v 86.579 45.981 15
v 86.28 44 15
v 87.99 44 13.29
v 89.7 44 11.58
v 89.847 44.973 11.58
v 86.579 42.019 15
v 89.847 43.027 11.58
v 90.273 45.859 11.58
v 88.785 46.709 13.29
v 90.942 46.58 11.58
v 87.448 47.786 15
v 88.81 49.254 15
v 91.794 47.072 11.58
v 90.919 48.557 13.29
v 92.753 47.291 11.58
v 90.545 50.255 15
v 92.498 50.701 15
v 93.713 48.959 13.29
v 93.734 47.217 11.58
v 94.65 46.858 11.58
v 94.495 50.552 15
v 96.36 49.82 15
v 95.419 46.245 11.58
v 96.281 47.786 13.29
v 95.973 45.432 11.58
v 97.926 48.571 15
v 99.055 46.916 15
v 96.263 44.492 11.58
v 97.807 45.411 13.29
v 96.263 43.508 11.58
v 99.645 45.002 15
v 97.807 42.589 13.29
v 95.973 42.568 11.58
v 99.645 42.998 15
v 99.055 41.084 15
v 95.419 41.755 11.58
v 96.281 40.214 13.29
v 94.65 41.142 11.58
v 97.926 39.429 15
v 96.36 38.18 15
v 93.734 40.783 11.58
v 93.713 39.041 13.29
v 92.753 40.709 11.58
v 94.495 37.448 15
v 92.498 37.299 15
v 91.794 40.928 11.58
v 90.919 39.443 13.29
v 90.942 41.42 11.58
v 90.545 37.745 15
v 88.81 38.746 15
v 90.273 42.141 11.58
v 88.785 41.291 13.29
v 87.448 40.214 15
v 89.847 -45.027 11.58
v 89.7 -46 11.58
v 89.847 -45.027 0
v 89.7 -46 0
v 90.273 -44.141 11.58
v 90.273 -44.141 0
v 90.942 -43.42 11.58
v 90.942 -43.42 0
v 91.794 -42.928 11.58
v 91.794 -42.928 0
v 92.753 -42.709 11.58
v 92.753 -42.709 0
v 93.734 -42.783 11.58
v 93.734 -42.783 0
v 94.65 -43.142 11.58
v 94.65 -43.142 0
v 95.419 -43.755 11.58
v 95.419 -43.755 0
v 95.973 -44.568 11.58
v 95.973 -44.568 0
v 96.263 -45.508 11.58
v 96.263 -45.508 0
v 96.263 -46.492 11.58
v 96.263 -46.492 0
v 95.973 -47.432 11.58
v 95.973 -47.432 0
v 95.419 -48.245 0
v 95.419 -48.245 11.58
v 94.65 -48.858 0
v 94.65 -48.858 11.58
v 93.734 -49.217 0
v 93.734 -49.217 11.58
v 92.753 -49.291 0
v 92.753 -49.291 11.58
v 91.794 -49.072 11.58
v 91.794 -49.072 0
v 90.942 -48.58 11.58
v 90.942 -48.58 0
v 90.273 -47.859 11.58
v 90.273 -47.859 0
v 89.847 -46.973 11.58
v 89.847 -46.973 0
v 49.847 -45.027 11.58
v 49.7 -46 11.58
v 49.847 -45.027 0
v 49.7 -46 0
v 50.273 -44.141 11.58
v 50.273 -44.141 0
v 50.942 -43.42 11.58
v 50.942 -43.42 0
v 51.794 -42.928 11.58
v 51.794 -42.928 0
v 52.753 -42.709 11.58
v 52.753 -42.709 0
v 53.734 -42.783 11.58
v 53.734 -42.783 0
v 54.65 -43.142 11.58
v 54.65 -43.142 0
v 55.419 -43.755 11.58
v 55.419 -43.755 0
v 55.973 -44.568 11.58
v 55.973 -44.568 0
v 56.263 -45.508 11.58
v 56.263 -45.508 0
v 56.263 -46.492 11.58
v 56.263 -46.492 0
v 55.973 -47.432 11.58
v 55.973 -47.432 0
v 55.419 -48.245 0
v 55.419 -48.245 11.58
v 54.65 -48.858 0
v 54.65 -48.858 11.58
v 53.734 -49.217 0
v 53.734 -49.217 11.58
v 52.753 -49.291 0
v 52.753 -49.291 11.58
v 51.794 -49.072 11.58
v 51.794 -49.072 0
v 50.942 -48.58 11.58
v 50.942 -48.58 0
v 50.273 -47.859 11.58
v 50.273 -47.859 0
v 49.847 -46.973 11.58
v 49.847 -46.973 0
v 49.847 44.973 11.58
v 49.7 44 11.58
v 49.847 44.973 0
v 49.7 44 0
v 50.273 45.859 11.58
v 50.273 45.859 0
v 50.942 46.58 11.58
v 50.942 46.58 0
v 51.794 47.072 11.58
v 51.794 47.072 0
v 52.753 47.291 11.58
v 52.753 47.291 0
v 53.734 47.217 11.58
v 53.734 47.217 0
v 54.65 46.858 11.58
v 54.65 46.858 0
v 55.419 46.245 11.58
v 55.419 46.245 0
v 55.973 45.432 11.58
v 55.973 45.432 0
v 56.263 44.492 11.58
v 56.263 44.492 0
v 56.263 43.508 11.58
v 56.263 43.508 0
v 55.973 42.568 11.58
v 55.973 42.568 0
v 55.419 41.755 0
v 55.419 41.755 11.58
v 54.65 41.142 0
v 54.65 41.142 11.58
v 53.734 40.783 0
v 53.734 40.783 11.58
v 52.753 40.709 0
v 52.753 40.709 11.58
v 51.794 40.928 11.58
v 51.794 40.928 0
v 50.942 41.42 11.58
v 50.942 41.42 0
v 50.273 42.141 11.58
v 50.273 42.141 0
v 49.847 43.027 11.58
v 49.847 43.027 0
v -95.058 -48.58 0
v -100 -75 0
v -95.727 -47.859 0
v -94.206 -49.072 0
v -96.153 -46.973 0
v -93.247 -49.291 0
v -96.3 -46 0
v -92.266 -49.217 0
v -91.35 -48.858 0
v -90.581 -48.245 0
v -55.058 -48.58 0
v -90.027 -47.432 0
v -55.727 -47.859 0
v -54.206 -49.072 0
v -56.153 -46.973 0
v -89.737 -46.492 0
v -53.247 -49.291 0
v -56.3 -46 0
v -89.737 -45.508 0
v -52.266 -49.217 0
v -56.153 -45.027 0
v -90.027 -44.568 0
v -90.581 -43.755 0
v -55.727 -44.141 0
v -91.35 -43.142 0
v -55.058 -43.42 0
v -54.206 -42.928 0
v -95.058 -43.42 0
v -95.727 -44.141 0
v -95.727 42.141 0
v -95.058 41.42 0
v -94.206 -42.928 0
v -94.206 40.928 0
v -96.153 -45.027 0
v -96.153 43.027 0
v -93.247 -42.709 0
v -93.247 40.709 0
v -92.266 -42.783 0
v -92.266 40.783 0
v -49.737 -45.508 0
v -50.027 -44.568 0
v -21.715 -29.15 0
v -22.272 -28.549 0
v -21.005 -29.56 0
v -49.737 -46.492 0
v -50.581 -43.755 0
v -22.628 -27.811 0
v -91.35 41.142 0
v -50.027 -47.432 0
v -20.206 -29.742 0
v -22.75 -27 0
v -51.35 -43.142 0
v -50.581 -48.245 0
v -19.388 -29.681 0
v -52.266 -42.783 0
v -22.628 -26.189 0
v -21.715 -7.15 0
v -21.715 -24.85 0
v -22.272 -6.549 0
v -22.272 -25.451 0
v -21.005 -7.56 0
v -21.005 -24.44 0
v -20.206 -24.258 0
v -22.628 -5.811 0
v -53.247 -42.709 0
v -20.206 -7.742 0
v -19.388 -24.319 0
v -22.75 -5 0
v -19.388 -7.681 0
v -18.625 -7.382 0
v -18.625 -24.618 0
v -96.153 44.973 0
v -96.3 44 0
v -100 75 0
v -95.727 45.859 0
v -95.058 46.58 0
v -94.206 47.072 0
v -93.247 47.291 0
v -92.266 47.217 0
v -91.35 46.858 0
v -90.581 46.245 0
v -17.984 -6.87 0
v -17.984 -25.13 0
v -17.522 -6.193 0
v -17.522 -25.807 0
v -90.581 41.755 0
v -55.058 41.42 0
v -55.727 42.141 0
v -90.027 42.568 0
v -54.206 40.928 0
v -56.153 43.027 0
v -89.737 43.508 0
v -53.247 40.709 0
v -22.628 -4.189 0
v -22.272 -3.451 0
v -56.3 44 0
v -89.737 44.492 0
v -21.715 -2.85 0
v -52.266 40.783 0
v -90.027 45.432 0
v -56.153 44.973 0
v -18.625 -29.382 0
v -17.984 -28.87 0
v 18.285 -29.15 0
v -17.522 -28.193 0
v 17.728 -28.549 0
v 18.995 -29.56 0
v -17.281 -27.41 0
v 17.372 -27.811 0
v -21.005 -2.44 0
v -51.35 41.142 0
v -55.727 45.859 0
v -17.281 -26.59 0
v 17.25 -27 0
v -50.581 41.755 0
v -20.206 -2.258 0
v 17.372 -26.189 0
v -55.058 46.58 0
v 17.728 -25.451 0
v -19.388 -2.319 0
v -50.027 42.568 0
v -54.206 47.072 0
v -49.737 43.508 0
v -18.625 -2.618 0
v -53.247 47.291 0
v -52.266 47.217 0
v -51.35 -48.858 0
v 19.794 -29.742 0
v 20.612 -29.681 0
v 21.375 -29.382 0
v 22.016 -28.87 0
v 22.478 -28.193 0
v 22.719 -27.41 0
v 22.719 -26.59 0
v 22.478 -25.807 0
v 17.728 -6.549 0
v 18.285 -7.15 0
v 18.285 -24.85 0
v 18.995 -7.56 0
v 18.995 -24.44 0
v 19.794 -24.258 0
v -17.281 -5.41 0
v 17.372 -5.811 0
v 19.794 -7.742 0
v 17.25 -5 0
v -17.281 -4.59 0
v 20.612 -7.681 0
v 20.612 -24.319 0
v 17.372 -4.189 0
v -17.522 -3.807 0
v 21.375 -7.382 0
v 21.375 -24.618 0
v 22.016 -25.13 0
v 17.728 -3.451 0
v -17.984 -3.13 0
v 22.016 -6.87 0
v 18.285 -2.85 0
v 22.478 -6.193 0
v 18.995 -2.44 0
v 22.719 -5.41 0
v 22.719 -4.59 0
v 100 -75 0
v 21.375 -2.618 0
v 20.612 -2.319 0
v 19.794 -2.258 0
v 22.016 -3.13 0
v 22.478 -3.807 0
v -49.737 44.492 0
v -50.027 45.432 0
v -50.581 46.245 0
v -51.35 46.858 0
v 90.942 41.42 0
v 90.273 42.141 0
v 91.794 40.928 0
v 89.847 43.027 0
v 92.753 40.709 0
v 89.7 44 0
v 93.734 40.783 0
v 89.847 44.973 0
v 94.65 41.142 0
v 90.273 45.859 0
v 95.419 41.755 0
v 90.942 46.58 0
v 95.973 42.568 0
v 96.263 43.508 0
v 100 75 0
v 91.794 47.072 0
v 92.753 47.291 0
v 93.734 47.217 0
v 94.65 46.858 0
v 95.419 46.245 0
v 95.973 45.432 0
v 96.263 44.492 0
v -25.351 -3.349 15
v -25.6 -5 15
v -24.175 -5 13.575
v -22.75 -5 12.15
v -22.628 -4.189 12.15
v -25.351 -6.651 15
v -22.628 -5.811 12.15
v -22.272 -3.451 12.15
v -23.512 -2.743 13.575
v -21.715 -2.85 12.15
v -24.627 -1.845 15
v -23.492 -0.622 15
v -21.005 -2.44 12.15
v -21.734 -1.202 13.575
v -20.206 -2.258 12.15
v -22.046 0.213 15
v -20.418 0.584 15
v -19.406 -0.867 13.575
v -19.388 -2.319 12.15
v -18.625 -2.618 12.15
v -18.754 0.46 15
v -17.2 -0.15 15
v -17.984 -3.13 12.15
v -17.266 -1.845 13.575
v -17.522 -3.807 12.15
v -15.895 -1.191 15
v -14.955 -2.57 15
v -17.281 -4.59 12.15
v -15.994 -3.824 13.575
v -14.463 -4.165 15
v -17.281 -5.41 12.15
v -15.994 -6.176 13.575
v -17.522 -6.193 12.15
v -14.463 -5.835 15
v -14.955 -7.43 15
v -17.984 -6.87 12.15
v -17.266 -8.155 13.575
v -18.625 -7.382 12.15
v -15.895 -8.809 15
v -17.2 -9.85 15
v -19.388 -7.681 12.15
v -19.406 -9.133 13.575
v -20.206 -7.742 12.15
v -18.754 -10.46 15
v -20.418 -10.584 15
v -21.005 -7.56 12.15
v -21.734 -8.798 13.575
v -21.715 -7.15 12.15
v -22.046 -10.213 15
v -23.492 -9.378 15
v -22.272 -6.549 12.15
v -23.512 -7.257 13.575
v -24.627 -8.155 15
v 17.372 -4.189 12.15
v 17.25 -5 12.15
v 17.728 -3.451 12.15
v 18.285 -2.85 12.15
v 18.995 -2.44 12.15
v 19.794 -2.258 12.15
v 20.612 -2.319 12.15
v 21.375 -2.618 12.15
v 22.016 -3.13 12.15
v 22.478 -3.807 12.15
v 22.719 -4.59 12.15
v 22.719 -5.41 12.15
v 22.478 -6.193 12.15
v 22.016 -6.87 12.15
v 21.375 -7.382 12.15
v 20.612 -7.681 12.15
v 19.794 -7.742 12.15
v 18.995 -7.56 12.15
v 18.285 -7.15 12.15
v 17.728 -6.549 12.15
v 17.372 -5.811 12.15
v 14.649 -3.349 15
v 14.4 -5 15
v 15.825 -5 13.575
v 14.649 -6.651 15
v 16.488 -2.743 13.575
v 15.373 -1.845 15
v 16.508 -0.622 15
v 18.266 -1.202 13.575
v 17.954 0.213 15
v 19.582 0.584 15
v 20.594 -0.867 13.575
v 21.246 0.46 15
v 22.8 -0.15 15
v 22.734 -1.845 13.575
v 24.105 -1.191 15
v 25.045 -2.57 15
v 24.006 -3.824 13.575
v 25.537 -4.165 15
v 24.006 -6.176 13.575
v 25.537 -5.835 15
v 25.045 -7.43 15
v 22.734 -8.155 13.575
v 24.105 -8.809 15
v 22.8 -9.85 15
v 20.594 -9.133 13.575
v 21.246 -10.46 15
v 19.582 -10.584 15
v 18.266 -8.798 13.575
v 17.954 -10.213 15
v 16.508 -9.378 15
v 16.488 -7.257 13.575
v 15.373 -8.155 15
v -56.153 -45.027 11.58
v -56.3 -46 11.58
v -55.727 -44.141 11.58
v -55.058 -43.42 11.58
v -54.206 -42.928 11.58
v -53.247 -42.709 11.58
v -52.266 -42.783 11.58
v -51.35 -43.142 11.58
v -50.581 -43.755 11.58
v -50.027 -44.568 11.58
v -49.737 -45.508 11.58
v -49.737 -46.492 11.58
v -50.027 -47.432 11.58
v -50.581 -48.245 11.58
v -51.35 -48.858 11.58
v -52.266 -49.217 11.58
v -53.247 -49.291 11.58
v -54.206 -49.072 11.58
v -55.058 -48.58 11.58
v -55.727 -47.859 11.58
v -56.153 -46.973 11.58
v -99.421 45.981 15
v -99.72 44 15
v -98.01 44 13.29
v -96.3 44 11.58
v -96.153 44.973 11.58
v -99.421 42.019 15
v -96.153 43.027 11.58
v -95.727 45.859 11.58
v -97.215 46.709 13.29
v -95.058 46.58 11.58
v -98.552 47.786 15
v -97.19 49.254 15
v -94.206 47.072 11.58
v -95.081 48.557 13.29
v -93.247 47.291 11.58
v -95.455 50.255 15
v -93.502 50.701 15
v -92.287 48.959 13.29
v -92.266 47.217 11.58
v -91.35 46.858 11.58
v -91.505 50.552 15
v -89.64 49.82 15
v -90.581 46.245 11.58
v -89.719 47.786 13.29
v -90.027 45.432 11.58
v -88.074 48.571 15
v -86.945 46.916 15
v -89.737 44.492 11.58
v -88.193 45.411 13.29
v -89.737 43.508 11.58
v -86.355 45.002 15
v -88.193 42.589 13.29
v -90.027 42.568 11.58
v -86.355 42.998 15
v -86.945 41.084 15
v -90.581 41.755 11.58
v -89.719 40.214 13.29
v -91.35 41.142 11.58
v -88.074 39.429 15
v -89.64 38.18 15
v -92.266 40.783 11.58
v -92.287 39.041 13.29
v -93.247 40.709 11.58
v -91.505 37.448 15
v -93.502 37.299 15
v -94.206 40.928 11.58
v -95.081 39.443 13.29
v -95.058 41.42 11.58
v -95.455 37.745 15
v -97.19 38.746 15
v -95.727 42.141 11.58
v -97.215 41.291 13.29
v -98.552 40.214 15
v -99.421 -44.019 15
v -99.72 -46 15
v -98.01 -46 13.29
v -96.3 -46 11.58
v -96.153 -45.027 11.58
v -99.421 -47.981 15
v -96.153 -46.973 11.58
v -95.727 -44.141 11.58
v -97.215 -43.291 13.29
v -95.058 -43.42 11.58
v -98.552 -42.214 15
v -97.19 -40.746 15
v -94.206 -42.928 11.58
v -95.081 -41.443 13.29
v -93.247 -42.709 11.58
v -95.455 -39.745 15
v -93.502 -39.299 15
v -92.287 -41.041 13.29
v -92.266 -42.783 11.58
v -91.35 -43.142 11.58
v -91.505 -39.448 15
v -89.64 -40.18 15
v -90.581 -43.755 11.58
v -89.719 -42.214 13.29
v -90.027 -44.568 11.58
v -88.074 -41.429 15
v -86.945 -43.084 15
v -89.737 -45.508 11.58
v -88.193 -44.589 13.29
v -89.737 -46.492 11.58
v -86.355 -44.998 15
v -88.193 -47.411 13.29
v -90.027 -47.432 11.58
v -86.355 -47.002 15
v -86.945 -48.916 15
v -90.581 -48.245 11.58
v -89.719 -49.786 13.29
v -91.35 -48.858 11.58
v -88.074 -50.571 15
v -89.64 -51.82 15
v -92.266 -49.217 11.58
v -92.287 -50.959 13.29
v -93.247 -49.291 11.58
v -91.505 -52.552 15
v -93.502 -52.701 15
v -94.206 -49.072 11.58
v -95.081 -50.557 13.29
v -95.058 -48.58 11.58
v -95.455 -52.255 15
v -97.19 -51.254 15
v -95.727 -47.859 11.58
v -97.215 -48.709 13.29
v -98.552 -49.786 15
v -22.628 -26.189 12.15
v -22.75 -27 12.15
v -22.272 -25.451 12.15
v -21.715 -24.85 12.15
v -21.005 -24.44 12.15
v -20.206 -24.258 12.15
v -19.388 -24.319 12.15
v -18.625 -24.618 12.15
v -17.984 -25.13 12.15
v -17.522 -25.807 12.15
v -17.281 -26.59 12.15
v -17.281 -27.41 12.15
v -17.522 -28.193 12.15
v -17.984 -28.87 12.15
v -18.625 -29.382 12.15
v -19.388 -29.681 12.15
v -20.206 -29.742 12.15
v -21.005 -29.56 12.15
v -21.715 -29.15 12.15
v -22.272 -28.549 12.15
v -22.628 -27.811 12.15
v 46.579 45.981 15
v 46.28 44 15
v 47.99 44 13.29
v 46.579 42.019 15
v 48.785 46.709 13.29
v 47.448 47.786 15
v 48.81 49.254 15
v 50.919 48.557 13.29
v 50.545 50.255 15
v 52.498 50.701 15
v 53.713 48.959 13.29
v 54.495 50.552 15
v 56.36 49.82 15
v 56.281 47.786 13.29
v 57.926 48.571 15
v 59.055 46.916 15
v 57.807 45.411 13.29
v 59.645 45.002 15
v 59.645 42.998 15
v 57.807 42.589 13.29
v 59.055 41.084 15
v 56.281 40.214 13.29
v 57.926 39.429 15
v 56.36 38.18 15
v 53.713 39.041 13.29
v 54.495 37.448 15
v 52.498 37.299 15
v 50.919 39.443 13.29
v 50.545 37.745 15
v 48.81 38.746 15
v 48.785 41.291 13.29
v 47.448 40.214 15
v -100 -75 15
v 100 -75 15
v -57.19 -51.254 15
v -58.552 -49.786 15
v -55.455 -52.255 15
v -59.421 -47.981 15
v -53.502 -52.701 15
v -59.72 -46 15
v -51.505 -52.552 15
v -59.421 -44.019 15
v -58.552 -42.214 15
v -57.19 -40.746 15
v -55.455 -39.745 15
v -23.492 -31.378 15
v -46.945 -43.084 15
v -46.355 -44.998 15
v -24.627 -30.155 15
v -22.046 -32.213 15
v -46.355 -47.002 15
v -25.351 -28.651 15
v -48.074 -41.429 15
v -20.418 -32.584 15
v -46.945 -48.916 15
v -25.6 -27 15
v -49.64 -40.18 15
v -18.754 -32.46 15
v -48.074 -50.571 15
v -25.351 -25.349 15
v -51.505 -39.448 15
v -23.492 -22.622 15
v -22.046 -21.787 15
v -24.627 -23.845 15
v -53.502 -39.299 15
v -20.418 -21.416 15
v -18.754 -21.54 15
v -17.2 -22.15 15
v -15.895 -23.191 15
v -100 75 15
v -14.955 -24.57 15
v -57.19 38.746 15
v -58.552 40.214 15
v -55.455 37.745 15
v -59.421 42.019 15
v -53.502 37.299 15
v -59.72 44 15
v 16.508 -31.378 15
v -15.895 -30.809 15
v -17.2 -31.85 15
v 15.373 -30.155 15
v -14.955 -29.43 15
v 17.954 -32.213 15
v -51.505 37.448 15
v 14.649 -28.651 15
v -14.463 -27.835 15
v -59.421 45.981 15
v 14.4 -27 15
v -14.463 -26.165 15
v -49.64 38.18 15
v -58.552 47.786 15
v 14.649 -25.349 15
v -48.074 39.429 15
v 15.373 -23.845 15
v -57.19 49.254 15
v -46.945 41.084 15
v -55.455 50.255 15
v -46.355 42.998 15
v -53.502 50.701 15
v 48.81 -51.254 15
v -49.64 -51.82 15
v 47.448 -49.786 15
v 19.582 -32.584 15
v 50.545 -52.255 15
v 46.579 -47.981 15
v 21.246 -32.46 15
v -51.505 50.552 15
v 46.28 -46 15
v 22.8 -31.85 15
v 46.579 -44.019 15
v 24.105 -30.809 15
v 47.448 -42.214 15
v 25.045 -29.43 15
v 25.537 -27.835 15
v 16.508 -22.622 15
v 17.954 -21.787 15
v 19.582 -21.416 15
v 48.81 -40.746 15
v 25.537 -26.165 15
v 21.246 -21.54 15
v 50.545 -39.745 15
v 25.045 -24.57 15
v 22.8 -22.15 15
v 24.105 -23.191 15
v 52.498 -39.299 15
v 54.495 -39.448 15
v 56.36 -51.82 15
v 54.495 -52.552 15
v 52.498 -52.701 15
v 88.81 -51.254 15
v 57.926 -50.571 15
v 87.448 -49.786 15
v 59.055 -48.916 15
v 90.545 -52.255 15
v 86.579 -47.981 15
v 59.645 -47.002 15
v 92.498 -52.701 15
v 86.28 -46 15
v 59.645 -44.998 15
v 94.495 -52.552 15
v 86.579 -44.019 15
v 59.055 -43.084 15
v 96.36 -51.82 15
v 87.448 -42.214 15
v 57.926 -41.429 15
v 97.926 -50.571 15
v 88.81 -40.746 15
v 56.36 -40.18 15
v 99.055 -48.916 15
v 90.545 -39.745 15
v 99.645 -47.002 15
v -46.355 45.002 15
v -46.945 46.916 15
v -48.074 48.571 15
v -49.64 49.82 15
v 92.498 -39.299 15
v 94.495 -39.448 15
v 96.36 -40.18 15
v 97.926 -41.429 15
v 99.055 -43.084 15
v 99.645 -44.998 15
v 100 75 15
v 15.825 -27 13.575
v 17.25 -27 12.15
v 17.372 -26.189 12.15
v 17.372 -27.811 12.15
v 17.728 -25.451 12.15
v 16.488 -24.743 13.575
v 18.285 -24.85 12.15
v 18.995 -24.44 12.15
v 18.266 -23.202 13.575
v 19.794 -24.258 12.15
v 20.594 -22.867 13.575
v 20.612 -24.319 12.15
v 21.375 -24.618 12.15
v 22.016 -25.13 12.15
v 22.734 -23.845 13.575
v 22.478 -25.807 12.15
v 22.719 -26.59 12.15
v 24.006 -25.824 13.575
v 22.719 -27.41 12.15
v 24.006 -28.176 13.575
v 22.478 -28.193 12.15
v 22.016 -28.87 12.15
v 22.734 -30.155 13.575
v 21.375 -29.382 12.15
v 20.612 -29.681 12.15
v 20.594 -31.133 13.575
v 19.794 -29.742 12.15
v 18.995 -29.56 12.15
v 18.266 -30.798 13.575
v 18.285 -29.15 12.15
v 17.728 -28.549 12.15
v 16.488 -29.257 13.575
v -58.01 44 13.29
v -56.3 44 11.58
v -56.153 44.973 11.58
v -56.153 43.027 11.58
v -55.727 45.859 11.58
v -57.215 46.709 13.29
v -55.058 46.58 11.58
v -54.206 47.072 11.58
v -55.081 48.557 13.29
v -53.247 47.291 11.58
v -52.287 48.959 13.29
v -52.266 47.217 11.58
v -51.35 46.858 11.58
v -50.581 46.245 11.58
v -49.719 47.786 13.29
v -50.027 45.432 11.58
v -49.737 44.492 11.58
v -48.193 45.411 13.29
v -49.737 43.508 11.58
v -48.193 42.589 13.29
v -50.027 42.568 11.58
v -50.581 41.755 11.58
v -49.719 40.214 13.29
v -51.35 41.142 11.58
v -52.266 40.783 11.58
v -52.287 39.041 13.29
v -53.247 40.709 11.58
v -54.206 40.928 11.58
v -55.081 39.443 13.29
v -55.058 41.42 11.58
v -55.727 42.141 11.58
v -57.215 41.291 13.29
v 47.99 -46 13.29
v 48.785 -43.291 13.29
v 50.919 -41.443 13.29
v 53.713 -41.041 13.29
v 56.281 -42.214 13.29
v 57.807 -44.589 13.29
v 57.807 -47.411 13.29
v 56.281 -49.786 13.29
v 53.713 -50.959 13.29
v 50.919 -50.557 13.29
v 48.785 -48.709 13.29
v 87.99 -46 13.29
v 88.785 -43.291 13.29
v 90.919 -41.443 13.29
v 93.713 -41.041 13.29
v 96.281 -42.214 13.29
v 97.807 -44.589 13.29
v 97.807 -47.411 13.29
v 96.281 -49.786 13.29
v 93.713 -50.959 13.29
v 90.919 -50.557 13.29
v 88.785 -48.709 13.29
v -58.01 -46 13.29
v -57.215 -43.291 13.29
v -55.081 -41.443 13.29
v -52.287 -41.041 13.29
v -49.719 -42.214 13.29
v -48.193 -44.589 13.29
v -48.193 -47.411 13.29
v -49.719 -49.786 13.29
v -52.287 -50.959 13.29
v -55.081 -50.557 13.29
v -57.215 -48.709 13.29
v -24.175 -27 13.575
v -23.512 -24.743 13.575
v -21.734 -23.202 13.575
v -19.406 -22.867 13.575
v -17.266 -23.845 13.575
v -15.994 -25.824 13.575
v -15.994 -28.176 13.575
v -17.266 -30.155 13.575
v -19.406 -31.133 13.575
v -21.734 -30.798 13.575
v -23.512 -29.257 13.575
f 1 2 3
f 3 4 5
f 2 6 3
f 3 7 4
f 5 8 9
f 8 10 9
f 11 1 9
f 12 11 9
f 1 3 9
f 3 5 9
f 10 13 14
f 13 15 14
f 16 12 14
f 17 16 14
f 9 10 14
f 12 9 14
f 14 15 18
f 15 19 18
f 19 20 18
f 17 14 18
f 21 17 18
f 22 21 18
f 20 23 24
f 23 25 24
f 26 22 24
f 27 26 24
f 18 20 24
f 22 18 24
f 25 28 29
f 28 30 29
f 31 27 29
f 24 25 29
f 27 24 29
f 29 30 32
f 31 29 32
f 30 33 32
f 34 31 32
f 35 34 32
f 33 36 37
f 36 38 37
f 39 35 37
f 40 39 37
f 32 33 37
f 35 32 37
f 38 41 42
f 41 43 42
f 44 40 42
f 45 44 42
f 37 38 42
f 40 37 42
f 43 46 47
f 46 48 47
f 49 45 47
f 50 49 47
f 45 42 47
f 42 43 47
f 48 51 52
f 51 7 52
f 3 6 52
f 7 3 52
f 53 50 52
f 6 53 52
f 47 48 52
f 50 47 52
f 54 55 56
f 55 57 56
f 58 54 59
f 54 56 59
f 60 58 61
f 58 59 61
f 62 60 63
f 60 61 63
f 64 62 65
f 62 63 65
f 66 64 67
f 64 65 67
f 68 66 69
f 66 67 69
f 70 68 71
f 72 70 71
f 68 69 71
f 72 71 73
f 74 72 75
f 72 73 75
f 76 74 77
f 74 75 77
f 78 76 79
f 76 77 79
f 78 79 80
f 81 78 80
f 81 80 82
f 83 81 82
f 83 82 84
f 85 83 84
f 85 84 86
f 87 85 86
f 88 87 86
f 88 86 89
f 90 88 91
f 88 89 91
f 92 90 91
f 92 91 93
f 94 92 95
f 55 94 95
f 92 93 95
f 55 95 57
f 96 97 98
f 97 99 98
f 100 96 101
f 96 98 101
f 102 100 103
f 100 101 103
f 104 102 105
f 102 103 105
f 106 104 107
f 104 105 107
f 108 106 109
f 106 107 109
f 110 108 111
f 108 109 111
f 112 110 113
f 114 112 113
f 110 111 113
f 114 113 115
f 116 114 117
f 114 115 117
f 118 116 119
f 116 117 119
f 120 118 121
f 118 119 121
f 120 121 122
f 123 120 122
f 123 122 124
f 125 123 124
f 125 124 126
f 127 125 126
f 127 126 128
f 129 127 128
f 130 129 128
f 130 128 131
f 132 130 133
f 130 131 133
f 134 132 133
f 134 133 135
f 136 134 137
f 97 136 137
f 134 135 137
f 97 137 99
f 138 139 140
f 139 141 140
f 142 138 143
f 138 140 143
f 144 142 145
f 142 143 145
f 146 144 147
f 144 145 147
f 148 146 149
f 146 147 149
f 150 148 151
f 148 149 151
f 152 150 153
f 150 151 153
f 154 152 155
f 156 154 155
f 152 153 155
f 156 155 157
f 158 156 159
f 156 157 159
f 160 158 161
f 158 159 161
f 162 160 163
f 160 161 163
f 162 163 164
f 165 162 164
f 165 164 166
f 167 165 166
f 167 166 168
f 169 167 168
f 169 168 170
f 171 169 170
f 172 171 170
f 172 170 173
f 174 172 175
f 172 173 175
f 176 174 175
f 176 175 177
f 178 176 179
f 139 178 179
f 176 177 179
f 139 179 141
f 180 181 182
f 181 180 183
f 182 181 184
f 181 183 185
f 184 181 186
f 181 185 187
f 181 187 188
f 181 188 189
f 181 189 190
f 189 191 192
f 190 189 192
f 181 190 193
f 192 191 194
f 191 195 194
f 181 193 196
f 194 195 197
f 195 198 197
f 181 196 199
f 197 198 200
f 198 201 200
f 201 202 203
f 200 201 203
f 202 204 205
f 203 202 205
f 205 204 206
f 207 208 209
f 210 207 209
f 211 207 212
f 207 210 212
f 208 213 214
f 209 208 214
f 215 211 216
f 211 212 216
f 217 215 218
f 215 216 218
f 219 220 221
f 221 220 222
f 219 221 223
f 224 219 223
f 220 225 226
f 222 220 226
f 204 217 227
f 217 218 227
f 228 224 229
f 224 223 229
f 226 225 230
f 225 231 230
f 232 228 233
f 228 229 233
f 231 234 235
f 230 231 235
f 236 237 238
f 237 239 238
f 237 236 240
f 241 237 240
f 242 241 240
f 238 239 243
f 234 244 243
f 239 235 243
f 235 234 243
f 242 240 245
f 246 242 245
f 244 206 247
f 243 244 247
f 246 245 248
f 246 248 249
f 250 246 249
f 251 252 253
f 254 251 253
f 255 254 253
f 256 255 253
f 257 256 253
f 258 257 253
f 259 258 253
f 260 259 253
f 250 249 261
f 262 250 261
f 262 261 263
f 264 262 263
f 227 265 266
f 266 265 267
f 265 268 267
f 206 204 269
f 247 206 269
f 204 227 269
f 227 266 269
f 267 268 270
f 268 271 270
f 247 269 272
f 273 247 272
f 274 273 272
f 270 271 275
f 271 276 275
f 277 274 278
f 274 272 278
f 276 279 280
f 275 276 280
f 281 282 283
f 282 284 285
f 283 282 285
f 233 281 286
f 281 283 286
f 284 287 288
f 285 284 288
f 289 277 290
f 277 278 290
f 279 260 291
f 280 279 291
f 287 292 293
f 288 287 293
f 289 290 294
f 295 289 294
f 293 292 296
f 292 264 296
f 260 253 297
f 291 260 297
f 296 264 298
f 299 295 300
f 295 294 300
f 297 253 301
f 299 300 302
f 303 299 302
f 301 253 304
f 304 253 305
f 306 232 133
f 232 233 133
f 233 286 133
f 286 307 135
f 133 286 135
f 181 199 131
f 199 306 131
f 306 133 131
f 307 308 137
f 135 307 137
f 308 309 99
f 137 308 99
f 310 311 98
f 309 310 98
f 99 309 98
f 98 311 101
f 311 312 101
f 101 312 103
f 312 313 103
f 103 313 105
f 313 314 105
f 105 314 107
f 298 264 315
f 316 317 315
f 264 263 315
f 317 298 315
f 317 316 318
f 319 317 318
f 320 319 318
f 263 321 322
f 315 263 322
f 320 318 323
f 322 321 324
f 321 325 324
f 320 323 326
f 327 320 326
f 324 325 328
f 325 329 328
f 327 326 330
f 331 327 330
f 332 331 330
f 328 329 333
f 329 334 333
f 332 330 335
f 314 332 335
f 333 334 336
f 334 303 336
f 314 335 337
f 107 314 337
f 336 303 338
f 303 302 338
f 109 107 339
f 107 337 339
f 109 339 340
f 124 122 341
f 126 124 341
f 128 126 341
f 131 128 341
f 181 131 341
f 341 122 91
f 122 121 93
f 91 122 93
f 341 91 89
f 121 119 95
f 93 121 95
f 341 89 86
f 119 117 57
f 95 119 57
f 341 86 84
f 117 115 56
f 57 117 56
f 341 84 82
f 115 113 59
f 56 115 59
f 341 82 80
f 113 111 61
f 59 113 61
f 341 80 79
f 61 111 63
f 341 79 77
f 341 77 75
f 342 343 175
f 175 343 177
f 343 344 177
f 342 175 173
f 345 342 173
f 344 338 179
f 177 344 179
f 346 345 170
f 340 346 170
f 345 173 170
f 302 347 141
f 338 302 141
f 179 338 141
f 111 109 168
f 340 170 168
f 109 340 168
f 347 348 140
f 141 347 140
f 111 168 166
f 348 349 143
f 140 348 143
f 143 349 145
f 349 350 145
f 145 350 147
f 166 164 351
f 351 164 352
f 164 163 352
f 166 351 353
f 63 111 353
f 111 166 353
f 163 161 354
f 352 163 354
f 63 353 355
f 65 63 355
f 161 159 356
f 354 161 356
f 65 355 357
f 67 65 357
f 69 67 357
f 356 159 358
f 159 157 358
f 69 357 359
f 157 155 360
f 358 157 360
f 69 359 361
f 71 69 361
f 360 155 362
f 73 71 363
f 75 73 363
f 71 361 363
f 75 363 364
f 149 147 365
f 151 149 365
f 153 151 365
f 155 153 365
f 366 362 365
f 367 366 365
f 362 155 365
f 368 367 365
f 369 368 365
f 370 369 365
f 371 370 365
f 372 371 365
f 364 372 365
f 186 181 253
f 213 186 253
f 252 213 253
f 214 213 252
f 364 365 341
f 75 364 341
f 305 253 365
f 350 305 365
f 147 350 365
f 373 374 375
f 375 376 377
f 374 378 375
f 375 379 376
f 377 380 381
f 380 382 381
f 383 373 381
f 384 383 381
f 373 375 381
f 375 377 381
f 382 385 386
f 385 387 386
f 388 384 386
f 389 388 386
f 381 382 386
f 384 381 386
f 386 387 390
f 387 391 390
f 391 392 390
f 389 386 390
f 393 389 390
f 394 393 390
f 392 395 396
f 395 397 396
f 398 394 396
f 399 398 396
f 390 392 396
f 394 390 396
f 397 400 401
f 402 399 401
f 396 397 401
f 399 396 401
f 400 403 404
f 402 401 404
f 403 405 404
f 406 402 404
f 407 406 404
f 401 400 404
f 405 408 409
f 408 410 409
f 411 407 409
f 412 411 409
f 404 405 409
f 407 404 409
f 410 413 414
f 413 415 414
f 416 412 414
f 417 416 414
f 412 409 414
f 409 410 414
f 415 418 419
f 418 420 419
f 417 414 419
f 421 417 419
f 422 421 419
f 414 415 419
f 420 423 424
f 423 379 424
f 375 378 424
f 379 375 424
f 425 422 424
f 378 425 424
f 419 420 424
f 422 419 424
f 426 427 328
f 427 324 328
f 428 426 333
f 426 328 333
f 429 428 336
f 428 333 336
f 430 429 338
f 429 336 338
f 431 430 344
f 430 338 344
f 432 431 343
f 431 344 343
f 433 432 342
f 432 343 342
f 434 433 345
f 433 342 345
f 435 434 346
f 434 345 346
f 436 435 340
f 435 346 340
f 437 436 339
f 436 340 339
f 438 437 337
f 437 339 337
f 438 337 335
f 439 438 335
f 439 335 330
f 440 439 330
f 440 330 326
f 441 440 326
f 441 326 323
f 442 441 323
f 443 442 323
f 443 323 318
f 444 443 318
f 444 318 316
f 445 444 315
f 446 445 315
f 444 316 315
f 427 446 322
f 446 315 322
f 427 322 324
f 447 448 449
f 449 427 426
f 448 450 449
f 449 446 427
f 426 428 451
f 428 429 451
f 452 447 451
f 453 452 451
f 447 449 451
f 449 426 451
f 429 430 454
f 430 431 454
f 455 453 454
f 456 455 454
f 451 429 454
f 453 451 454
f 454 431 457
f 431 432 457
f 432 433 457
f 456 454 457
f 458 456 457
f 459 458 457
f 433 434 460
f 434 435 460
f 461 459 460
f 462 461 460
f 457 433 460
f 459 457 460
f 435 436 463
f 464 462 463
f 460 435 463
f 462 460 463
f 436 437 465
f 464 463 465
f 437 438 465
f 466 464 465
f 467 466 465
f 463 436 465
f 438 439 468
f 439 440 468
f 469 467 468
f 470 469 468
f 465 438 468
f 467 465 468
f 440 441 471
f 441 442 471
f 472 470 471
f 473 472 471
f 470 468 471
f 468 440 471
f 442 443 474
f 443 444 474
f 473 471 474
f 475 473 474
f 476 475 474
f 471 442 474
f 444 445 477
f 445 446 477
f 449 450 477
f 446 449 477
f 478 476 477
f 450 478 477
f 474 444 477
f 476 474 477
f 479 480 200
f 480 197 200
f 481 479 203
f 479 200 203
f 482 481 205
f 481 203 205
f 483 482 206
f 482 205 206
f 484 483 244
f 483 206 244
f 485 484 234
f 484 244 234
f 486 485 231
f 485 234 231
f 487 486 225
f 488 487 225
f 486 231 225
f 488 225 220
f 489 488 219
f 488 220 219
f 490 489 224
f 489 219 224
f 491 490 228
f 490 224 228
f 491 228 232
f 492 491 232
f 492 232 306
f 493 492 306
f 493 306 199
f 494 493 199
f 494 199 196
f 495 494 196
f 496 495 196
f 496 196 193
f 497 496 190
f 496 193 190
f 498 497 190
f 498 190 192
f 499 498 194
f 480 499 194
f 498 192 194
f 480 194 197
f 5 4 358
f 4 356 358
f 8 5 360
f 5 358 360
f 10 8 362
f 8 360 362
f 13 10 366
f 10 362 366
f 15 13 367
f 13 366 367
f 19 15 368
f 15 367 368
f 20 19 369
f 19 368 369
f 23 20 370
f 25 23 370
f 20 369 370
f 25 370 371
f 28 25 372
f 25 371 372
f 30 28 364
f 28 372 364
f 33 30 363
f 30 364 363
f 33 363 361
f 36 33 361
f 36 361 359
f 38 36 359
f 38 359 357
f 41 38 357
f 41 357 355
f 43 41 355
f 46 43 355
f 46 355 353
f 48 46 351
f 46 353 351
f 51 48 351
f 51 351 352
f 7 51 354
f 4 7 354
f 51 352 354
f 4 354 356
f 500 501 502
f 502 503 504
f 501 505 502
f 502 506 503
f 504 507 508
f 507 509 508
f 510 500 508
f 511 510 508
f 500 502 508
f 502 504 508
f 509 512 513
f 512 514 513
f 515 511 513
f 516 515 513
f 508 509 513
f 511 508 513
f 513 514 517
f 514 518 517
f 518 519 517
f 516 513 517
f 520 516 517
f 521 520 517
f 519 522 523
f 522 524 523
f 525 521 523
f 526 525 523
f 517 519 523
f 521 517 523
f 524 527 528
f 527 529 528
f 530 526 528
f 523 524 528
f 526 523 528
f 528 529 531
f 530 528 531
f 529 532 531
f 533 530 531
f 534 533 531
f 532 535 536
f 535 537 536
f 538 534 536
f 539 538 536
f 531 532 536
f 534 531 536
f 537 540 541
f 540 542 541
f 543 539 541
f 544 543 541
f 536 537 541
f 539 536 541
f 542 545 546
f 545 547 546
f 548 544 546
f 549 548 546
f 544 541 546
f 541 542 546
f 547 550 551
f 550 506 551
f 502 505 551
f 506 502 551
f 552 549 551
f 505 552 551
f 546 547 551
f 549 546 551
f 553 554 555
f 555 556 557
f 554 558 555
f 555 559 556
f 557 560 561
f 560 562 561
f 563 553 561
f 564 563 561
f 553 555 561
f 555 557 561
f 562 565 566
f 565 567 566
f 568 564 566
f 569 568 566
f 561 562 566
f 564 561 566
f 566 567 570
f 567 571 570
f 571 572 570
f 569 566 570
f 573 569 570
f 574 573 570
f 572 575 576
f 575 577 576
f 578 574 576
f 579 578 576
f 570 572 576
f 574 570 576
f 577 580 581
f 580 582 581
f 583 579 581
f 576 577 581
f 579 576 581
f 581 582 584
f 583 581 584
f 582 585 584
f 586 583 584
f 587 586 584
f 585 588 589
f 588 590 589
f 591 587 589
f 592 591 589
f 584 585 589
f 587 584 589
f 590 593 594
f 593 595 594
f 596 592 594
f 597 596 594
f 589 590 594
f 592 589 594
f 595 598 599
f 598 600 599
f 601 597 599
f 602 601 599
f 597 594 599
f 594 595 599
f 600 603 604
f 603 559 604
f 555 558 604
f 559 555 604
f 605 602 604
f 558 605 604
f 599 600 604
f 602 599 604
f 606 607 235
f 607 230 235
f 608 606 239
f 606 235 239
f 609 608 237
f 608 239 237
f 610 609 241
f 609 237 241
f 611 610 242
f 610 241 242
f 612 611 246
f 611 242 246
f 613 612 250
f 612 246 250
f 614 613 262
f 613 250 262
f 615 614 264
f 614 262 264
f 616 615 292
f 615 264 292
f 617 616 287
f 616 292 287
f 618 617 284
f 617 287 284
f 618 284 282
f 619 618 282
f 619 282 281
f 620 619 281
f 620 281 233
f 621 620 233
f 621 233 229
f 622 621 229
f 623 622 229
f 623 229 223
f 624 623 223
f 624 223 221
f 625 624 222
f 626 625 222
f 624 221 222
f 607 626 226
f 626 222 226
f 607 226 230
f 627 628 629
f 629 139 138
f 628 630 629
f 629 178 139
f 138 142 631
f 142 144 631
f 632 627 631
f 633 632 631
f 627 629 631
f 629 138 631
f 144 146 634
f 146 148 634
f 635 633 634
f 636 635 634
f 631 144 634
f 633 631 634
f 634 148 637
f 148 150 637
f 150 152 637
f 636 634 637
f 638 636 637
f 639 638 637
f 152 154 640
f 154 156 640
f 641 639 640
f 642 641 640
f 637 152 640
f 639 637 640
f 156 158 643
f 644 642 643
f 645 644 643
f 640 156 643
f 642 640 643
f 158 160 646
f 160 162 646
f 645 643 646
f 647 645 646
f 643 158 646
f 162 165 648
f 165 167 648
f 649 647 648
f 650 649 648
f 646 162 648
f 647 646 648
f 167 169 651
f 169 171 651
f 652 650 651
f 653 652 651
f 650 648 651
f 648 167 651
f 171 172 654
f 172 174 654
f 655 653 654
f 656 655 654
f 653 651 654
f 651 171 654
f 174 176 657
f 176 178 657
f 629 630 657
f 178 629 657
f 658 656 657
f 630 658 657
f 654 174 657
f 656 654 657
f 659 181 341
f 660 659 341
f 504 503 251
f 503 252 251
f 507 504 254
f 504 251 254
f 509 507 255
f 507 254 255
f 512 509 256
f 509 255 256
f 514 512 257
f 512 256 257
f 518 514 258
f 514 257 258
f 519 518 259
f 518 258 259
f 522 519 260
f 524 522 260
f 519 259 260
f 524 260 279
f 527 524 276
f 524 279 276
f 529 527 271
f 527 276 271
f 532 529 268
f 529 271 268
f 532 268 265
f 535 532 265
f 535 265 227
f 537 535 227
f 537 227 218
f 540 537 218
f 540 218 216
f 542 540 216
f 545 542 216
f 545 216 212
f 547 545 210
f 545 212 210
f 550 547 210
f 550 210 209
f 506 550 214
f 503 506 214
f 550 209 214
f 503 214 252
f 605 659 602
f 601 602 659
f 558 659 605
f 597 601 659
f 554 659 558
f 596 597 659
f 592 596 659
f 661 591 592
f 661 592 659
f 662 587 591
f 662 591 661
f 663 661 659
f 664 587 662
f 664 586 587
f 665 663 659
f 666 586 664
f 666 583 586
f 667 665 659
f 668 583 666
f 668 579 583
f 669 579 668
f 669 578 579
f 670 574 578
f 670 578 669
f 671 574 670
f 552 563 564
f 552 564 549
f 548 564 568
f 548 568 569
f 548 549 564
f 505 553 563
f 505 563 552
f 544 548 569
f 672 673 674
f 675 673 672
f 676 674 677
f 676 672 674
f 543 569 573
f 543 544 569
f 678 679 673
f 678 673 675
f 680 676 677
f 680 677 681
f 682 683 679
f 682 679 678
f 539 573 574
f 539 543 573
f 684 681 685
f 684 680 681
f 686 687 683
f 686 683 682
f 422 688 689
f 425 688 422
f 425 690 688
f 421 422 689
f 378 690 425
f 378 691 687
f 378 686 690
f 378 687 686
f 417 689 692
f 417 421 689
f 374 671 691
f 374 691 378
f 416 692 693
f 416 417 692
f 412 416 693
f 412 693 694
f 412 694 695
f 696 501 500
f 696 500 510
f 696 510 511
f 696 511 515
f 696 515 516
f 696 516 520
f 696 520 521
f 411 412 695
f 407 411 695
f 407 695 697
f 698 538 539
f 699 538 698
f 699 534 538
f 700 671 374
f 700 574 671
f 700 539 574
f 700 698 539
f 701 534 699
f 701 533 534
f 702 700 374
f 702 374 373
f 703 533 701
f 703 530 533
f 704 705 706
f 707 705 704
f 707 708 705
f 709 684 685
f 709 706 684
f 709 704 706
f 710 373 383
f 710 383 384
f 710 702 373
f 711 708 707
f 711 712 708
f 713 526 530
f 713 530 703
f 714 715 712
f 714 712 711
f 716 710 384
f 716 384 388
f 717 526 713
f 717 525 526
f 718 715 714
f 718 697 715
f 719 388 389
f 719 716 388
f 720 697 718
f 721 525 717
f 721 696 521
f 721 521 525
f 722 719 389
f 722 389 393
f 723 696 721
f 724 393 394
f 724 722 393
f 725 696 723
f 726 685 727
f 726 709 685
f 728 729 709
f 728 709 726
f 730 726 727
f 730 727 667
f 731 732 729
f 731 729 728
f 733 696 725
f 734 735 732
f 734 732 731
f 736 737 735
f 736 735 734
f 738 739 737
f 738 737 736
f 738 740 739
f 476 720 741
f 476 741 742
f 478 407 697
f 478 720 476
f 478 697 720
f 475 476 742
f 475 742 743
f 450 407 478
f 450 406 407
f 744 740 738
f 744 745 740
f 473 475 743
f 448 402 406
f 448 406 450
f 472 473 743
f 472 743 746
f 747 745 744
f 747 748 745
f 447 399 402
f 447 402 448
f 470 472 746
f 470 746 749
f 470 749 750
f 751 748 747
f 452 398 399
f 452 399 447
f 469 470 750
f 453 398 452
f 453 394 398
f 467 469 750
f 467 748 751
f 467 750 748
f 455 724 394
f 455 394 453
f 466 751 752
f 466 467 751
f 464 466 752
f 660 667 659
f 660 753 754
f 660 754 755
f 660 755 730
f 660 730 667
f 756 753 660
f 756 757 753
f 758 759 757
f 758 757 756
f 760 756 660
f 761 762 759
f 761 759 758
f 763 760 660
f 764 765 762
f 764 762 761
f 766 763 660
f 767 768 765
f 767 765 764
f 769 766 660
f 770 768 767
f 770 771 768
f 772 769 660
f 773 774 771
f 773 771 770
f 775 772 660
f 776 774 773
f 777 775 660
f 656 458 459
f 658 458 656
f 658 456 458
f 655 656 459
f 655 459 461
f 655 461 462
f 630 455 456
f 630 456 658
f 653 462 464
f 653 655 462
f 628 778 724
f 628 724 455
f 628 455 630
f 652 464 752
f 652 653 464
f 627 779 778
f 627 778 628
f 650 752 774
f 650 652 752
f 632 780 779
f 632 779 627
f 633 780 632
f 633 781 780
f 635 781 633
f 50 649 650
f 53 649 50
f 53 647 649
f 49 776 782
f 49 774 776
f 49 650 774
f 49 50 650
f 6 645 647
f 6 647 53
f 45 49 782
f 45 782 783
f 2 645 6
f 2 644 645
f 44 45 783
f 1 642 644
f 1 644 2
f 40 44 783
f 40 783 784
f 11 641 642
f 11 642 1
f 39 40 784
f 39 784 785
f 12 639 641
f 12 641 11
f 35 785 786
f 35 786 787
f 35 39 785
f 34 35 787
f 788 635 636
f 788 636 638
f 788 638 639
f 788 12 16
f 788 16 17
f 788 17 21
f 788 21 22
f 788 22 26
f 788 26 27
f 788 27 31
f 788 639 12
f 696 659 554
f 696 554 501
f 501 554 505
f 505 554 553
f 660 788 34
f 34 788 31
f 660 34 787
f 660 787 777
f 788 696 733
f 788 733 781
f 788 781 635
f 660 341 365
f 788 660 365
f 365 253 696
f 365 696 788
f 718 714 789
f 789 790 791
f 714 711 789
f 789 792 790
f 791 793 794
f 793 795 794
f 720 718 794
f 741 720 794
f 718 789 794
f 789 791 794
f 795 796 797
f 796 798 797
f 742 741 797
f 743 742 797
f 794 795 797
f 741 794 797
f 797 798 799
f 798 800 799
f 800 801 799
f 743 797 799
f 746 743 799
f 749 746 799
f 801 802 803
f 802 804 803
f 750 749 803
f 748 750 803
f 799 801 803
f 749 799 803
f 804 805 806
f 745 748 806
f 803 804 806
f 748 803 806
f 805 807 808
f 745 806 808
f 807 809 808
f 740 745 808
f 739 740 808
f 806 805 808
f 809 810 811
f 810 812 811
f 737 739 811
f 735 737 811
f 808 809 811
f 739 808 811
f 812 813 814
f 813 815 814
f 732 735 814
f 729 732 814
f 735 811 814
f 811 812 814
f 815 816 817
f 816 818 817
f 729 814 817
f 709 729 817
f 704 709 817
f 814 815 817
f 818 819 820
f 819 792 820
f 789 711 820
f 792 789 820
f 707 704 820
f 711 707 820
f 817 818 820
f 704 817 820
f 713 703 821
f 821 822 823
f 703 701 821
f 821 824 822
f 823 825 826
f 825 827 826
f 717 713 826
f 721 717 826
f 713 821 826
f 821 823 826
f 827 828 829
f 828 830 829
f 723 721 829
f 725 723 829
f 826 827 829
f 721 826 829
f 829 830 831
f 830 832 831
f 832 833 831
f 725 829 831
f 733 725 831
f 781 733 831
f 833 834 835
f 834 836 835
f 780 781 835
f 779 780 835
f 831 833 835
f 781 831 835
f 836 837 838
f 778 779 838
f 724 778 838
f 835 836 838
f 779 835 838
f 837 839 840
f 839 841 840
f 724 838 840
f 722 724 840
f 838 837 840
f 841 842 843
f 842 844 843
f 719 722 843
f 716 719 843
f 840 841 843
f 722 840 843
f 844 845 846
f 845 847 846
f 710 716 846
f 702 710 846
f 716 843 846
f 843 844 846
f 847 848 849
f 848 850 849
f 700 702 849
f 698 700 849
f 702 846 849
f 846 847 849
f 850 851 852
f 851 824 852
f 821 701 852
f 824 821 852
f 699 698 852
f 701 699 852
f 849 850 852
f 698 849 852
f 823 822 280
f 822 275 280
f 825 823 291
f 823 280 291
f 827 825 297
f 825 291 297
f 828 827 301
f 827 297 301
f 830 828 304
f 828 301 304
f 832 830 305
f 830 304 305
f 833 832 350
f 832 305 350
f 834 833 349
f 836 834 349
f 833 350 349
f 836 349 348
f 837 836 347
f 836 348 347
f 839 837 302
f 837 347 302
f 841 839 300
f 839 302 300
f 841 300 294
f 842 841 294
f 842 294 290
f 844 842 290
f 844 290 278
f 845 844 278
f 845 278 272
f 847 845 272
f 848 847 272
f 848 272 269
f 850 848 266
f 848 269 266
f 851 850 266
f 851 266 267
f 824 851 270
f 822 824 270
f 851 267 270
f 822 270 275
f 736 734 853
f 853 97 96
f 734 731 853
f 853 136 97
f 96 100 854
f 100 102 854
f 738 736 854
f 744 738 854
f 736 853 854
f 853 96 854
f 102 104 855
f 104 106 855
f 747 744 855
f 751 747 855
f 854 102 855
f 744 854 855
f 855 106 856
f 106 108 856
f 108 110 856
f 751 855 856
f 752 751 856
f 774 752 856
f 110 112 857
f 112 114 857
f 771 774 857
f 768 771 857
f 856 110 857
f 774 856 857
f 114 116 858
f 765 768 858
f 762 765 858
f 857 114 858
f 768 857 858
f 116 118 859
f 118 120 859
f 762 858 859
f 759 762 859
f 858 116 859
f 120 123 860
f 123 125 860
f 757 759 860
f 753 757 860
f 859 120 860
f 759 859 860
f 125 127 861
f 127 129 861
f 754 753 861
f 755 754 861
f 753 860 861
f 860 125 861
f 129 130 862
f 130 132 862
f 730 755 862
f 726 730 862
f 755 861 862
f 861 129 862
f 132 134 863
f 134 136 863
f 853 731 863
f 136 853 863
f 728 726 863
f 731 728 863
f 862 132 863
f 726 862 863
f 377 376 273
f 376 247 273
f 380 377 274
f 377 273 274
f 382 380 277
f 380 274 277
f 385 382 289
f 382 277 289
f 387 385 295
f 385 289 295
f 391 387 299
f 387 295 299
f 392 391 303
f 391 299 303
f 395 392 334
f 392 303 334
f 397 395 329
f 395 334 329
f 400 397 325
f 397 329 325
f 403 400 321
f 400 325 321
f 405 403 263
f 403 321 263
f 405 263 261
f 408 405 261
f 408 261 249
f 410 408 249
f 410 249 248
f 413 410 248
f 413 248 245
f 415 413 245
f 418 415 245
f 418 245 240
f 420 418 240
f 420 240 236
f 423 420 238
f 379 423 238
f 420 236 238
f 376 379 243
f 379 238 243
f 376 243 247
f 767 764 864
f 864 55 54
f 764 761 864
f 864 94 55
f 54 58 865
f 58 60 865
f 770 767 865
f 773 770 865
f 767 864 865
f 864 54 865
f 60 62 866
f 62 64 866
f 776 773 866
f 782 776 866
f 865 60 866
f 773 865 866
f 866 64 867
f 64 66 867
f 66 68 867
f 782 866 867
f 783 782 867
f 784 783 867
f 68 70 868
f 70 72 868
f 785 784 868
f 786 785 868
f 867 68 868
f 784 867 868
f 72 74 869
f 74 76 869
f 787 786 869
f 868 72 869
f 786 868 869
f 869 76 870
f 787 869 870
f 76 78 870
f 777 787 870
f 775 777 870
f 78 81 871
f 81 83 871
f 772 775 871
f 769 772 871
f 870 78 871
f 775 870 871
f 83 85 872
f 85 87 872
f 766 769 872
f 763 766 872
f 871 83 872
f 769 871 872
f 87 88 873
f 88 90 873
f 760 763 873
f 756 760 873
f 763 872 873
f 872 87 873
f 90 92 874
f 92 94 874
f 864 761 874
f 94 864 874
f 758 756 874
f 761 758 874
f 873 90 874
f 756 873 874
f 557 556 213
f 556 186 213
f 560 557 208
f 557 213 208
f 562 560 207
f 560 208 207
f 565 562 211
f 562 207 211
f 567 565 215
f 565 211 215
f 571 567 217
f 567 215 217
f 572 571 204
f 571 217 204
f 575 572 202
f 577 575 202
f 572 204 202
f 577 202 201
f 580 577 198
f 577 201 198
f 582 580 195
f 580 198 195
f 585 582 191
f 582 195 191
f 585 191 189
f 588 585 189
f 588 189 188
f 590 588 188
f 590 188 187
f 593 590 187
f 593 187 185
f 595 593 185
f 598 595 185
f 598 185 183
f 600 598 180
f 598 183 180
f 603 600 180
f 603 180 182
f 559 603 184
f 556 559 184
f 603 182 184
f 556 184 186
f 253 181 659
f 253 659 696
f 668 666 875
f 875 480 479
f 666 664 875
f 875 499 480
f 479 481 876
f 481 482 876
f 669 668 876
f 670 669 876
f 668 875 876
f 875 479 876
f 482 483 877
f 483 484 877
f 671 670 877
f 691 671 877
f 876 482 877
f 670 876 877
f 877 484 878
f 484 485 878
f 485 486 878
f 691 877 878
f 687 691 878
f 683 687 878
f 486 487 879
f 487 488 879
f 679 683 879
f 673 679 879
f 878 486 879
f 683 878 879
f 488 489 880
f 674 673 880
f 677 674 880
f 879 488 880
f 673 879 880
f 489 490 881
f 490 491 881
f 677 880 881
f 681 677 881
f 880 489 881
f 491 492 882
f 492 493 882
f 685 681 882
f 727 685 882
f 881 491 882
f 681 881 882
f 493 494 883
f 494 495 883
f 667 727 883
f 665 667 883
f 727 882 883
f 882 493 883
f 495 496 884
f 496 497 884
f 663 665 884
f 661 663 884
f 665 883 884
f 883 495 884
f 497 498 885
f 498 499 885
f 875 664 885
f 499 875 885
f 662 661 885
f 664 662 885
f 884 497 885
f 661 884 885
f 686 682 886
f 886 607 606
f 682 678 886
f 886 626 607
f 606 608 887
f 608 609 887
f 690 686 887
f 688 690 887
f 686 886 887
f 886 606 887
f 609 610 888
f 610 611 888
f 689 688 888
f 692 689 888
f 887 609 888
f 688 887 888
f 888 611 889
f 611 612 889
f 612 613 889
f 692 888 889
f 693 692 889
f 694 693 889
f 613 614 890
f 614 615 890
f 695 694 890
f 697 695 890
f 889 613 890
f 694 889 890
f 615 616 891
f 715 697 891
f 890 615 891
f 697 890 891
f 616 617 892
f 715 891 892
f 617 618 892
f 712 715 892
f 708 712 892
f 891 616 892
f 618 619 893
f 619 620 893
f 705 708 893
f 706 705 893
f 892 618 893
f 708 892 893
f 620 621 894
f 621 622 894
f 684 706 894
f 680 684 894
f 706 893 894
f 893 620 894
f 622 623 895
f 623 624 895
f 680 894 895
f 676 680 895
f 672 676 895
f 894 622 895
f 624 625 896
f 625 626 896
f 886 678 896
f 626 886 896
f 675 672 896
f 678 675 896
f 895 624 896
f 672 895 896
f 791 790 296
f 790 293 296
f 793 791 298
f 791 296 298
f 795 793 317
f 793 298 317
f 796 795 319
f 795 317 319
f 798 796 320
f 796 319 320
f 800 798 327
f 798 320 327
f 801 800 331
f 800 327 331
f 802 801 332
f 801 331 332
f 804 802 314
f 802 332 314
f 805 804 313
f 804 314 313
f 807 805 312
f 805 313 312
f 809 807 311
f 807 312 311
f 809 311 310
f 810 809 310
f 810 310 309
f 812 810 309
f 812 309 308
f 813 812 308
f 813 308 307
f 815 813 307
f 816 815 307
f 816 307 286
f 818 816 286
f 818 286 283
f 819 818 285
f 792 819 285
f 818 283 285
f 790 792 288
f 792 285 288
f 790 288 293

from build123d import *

# Parameters (mm, degrees)
F0_W           = 200
F0_H           = 150
F1_DEPTH       = 15
F3_D           = 6.6
F3_CSINK_D     = 13.44
F3_CSINK_ANGLE = 90
F4_D           = 5.5
F4_CSINK_D     = 11.2
F4_CSINK_ANGLE = 90


with BuildPart() as f1:
    # F0 (on Top) → F1 (new body)
    with BuildSketch(Plane.XY):
        Rectangle(F0_W, F0_H)
    extrude(amount=F1_DEPTH)

    # F3 (through all)
    with Locations(Plane.XY.offset(15)):
        with Locations((-93, 44), (-53, 44), (-93, -46), (-53, -46), (53, 44), (93, 44), (53, -46), (93, -46)):
            CounterSinkHole(F3_D / 2, F3_CSINK_D / 2, counter_sink_angle=F3_CSINK_ANGLE)

    # F4 (through all)
    with Locations(Plane.XY.offset(15)):
        with Locations((-20, -27), (-20, -5), (20, -5), (20, -27)):
            CounterSinkHole(F4_D / 2, F4_CSINK_D / 2, counter_sink_angle=F4_CSINK_ANGLE)


solid = f1.part
